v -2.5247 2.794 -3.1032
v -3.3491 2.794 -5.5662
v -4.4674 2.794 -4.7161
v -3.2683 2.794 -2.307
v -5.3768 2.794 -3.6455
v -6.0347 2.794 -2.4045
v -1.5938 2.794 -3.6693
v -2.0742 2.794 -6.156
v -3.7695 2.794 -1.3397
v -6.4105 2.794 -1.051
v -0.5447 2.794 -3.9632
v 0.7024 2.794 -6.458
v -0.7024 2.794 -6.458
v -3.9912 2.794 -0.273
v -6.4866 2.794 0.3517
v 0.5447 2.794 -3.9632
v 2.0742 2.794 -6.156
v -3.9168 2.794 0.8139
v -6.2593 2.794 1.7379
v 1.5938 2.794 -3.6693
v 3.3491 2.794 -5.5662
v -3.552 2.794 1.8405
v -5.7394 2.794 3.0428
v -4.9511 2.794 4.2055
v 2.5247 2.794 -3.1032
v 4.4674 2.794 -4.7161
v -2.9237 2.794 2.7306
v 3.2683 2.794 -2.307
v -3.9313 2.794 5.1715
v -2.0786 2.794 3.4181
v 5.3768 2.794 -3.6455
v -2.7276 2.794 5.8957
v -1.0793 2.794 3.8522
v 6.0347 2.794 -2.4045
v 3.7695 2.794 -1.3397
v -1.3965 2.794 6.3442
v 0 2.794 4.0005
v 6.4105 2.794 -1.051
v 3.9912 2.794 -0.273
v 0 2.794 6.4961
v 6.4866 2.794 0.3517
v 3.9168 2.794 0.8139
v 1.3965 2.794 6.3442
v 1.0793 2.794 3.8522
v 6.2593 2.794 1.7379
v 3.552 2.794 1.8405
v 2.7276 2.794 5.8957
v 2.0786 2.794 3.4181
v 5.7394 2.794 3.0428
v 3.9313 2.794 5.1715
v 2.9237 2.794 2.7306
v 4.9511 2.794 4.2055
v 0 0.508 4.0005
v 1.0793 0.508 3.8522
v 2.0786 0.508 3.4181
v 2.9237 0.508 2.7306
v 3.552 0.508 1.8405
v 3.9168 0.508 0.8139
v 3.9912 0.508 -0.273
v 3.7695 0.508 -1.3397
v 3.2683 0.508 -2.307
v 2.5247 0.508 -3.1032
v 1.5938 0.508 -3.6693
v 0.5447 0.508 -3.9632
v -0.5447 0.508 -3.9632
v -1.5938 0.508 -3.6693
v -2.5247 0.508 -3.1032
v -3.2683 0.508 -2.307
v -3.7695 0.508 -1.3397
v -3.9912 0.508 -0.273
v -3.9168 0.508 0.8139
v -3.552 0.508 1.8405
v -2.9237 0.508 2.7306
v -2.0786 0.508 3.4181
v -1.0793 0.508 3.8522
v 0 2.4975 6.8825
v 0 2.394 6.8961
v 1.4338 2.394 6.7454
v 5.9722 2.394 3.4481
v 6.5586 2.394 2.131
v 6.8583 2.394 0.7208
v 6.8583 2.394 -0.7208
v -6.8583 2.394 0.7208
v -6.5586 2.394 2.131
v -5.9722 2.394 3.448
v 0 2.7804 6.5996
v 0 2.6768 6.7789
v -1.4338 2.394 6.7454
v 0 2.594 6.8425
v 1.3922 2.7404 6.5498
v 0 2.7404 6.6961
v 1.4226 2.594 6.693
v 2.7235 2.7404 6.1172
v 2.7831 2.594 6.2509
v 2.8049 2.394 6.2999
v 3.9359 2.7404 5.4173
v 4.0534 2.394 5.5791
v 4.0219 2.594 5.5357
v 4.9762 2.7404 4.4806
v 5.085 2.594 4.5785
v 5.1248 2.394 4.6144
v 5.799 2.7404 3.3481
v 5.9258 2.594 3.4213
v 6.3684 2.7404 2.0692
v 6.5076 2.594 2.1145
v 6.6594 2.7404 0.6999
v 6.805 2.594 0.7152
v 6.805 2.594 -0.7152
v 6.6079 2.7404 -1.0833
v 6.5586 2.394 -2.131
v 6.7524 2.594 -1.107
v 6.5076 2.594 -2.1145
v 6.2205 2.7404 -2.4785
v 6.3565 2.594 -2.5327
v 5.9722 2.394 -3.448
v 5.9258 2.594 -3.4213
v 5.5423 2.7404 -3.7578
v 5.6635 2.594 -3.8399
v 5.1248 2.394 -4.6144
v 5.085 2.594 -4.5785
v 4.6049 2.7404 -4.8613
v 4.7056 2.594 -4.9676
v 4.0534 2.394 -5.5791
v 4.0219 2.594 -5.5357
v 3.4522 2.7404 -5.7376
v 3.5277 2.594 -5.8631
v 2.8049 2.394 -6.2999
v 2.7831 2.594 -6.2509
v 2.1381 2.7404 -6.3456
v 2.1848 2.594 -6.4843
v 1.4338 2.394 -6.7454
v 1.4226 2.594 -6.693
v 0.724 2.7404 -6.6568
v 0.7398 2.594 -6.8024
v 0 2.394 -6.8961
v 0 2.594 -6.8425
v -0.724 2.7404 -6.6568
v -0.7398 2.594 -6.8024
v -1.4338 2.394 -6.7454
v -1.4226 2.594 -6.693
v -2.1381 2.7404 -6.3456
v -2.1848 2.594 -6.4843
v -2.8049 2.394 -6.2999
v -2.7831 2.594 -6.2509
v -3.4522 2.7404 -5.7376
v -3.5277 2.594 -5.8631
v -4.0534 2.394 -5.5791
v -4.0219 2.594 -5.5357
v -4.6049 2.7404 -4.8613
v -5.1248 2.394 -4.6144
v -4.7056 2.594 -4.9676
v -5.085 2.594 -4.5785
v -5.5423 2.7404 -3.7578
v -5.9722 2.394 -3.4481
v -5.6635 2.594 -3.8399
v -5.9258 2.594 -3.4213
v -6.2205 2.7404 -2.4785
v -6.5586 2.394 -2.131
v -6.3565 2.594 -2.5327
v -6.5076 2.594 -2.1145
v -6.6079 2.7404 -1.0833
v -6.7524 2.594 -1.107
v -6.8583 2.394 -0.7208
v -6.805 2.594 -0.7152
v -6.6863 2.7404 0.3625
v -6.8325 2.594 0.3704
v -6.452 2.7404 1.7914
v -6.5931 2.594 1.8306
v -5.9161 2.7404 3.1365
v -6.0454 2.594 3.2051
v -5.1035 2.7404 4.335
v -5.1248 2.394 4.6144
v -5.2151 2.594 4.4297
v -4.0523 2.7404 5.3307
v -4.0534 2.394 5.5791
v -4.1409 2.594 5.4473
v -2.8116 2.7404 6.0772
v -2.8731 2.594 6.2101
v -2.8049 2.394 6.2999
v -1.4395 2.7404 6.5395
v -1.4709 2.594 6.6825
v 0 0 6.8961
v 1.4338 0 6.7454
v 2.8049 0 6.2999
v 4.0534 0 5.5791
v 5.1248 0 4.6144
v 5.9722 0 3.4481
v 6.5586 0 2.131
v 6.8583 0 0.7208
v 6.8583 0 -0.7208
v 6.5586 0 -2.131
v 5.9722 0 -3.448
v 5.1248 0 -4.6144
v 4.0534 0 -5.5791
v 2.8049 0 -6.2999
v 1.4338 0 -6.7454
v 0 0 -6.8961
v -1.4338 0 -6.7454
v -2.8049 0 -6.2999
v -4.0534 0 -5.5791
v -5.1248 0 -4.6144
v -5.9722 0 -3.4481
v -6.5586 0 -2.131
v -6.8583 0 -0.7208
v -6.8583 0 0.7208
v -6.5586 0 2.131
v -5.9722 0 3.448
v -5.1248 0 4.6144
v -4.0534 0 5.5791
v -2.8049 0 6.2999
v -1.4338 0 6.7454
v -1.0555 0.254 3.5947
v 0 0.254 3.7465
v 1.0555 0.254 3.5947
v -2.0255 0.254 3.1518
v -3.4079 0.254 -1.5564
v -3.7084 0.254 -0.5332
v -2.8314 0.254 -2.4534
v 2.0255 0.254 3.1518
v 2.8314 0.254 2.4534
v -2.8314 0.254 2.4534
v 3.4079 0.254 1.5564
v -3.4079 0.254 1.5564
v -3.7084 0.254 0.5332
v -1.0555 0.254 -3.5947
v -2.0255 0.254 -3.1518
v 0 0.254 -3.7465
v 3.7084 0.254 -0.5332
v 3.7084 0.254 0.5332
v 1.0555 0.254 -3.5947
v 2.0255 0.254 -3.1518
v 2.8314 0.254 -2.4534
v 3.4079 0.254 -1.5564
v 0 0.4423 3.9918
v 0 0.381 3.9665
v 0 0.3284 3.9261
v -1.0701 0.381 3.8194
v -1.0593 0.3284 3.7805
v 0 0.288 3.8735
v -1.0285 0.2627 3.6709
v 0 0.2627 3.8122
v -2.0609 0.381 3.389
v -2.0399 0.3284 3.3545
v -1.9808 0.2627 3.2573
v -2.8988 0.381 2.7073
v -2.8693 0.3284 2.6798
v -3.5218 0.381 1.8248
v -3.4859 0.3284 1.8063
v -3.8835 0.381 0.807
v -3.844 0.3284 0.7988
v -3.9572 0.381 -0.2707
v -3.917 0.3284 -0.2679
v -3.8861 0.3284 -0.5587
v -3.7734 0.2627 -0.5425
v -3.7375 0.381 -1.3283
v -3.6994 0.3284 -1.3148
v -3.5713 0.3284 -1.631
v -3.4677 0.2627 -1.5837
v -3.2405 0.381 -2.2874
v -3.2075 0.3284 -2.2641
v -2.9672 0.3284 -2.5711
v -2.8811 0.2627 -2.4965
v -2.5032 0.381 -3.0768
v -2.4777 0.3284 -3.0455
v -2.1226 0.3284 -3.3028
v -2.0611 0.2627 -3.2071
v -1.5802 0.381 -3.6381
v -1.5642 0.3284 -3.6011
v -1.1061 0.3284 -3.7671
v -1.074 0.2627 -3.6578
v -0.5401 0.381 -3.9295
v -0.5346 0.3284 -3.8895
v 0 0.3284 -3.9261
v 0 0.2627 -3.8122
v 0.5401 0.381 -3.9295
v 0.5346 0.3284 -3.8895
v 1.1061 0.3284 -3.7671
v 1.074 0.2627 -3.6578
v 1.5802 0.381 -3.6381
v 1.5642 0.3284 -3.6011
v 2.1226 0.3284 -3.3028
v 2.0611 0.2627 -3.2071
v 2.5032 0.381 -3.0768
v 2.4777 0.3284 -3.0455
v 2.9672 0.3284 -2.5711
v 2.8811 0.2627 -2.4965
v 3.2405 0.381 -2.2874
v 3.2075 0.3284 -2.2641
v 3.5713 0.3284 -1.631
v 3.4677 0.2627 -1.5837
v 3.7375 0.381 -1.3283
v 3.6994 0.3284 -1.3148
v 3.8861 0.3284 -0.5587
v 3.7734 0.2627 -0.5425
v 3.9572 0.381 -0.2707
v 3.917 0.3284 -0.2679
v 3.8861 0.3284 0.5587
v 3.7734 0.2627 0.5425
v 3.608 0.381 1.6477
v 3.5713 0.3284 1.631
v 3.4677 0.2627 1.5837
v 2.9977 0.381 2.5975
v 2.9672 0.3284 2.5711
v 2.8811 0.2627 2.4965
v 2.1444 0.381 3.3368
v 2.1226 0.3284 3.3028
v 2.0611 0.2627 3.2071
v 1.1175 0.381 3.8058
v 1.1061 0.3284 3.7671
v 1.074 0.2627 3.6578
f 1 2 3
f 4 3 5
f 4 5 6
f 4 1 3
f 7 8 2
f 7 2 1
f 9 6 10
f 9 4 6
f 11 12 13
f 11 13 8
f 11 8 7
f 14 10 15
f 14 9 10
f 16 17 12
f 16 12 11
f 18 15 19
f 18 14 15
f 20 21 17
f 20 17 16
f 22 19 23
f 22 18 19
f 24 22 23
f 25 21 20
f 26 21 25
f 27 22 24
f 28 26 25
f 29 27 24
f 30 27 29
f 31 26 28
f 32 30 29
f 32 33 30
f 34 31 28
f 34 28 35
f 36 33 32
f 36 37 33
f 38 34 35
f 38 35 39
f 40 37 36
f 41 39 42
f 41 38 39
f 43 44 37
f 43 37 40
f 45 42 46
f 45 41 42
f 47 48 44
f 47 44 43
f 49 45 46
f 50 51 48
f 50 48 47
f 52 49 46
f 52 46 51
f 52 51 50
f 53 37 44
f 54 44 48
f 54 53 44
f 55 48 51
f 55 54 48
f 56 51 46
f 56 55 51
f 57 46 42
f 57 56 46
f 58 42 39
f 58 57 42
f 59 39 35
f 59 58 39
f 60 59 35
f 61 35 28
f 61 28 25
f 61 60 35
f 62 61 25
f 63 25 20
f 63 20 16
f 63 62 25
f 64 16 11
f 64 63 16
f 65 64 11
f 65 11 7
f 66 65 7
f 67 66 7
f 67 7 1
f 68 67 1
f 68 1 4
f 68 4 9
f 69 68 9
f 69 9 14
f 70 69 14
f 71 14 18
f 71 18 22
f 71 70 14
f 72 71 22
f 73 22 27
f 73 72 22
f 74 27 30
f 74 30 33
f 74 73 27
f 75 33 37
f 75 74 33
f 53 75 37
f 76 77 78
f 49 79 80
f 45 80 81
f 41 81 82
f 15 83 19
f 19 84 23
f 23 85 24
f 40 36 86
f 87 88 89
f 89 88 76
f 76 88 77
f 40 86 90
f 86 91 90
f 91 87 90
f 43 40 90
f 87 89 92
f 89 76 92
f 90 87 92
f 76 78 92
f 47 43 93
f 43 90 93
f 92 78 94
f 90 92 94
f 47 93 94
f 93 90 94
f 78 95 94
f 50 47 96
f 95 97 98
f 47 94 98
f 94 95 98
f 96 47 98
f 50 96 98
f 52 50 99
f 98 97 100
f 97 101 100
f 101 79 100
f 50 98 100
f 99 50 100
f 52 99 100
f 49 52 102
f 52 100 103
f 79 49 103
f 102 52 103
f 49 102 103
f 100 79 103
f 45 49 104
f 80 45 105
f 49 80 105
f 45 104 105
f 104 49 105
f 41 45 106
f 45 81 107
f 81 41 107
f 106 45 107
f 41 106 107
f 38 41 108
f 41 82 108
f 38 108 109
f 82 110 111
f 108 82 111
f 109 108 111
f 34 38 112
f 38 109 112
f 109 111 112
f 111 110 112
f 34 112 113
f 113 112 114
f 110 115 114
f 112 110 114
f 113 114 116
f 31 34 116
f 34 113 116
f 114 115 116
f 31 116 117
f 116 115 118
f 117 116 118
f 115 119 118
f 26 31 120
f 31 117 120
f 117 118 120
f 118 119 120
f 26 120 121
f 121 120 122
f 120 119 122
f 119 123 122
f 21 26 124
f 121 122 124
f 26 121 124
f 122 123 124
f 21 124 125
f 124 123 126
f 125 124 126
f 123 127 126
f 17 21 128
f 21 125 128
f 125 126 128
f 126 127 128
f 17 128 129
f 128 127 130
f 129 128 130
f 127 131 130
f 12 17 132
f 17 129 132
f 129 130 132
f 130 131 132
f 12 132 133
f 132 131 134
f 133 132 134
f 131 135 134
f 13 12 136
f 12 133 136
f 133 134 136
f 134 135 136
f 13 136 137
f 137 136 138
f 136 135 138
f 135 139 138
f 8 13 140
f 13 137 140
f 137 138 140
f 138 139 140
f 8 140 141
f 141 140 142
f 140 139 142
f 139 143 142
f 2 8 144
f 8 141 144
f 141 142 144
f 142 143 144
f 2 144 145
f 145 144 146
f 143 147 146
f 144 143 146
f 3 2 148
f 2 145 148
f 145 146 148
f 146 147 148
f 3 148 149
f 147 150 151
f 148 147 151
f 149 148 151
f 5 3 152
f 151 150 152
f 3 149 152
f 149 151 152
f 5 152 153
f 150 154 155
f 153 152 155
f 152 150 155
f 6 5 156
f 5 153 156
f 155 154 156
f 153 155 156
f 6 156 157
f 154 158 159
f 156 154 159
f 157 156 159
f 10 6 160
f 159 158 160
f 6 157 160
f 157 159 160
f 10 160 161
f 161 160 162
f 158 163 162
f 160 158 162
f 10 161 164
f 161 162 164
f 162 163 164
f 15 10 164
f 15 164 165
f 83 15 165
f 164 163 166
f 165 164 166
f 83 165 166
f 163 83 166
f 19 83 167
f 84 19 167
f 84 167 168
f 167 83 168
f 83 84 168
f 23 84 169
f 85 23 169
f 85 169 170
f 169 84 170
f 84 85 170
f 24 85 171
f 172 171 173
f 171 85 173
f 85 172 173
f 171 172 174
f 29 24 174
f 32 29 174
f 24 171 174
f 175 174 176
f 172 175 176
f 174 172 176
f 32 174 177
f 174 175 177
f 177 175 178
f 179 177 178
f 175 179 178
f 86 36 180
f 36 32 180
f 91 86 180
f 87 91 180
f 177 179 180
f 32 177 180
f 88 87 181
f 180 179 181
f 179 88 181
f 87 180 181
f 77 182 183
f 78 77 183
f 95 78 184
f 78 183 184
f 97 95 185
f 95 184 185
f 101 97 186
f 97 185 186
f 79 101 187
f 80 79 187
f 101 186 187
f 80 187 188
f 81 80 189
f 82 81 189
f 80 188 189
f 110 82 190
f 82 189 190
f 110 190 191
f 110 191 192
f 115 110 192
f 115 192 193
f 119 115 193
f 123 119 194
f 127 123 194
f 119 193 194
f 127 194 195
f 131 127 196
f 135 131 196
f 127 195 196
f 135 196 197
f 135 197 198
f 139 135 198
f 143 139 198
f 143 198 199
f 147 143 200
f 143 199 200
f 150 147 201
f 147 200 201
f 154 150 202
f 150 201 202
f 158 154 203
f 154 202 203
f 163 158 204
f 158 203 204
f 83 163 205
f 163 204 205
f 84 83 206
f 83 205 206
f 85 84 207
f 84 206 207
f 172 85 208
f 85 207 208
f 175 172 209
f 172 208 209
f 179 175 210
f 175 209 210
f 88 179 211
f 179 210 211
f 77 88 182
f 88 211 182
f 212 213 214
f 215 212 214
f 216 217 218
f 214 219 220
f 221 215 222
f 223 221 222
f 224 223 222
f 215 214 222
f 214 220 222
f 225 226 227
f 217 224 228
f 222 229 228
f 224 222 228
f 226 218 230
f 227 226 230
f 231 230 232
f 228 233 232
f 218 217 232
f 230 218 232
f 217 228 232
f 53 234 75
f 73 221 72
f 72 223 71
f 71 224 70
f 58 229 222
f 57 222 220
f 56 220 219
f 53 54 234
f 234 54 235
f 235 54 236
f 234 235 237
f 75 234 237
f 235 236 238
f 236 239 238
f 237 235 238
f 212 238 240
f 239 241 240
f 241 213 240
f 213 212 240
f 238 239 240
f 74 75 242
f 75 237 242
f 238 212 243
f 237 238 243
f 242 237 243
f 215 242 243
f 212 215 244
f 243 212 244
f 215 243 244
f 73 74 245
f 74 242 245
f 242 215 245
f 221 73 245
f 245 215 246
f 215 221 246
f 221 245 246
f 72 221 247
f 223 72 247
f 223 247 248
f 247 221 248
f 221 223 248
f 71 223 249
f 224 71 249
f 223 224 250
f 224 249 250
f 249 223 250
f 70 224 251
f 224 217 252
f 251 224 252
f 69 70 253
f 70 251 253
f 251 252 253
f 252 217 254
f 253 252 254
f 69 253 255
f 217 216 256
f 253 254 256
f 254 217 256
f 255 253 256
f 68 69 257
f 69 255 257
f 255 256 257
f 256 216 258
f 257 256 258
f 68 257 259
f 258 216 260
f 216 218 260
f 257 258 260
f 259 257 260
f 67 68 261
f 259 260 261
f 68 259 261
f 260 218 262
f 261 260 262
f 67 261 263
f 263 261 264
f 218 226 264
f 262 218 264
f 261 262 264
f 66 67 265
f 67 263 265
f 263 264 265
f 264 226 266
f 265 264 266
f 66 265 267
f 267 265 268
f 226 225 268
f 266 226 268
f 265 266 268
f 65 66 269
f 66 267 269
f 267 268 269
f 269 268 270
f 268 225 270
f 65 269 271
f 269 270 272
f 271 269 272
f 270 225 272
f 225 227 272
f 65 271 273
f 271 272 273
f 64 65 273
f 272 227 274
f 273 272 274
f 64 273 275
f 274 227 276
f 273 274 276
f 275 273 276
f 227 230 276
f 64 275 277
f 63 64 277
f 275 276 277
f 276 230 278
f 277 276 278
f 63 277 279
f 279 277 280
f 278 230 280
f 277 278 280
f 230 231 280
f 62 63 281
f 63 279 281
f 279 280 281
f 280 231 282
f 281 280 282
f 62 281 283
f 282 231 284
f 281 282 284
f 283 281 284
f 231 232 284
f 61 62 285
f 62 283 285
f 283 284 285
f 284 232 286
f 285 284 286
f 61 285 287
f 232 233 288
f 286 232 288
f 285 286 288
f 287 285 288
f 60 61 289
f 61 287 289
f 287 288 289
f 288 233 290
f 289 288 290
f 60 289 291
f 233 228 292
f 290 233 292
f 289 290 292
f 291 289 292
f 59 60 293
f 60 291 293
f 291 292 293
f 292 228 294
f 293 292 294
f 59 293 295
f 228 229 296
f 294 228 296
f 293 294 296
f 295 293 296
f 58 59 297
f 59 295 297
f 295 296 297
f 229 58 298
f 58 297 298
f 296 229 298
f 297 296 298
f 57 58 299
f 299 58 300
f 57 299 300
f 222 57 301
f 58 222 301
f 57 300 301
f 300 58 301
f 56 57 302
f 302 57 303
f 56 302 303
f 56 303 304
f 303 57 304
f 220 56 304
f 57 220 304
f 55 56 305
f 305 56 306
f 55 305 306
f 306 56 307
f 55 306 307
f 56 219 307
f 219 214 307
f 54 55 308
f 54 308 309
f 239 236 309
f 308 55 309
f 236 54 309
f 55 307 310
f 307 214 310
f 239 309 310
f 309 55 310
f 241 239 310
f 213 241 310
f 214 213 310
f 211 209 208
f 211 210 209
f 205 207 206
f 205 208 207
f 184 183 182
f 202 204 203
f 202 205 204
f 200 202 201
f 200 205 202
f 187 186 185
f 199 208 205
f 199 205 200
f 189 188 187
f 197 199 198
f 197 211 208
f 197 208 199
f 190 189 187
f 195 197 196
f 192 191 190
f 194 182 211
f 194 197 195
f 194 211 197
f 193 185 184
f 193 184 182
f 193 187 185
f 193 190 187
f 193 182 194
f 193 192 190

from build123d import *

# Parameters (mm, degrees)
SKETCH1_R           = 6.8961
SKETCH1_R_2         = 4.0005
BOSS_EXTRUDE1_DEPTH = 2.794
SKETCH2_R           = 4.0005
BOSS_EXTRUDE2_DEPTH = 0.254
FILLET1_R           = 0.254
FILLET3_R           = 0.4


with BuildPart() as part:
    # Sketch1 → Boss-Extrude1 (new body)
    with BuildSketch(Plane(origin=(0, 0, 0), x_dir=(1, 0, 0), z_dir=(0, 1, 0))):
        with Locations(Location((0, 0, 0), (0, 0, 270))):
            Circle(SKETCH1_R)
        with Locations(Location((0, 0, 0), (0, 0, 270))):
            Circle(SKETCH1_R_2, mode=Mode.SUBTRACT)
    extrude(amount=BOSS_EXTRUDE1_DEPTH)

    # Sketch2 → Boss-Extrude2 (add)
    with BuildSketch(Plane.XZ):
        with Locations(Location((0, 0, 0), (0, 0, 270))):
            Circle(SKETCH2_R)
    extrude(amount=-BOSS_EXTRUDE2_DEPTH)

    # Fillet1
    fillet1_edges = [part.edges().sort_by_distance(p)[0] for p in [
        (0, 0.254, -4.0005),
    ]]
    fillet(fillet1_edges, radius=FILLET1_R)

    # Fillet3
    fillet3_edges = [part.edges().sort_by_distance(p)[0] for p in [
        (0, 2.794, -6.8961),
    ]]
    fillet(fillet3_edges, radius=FILLET3_R)


solid = part.part
